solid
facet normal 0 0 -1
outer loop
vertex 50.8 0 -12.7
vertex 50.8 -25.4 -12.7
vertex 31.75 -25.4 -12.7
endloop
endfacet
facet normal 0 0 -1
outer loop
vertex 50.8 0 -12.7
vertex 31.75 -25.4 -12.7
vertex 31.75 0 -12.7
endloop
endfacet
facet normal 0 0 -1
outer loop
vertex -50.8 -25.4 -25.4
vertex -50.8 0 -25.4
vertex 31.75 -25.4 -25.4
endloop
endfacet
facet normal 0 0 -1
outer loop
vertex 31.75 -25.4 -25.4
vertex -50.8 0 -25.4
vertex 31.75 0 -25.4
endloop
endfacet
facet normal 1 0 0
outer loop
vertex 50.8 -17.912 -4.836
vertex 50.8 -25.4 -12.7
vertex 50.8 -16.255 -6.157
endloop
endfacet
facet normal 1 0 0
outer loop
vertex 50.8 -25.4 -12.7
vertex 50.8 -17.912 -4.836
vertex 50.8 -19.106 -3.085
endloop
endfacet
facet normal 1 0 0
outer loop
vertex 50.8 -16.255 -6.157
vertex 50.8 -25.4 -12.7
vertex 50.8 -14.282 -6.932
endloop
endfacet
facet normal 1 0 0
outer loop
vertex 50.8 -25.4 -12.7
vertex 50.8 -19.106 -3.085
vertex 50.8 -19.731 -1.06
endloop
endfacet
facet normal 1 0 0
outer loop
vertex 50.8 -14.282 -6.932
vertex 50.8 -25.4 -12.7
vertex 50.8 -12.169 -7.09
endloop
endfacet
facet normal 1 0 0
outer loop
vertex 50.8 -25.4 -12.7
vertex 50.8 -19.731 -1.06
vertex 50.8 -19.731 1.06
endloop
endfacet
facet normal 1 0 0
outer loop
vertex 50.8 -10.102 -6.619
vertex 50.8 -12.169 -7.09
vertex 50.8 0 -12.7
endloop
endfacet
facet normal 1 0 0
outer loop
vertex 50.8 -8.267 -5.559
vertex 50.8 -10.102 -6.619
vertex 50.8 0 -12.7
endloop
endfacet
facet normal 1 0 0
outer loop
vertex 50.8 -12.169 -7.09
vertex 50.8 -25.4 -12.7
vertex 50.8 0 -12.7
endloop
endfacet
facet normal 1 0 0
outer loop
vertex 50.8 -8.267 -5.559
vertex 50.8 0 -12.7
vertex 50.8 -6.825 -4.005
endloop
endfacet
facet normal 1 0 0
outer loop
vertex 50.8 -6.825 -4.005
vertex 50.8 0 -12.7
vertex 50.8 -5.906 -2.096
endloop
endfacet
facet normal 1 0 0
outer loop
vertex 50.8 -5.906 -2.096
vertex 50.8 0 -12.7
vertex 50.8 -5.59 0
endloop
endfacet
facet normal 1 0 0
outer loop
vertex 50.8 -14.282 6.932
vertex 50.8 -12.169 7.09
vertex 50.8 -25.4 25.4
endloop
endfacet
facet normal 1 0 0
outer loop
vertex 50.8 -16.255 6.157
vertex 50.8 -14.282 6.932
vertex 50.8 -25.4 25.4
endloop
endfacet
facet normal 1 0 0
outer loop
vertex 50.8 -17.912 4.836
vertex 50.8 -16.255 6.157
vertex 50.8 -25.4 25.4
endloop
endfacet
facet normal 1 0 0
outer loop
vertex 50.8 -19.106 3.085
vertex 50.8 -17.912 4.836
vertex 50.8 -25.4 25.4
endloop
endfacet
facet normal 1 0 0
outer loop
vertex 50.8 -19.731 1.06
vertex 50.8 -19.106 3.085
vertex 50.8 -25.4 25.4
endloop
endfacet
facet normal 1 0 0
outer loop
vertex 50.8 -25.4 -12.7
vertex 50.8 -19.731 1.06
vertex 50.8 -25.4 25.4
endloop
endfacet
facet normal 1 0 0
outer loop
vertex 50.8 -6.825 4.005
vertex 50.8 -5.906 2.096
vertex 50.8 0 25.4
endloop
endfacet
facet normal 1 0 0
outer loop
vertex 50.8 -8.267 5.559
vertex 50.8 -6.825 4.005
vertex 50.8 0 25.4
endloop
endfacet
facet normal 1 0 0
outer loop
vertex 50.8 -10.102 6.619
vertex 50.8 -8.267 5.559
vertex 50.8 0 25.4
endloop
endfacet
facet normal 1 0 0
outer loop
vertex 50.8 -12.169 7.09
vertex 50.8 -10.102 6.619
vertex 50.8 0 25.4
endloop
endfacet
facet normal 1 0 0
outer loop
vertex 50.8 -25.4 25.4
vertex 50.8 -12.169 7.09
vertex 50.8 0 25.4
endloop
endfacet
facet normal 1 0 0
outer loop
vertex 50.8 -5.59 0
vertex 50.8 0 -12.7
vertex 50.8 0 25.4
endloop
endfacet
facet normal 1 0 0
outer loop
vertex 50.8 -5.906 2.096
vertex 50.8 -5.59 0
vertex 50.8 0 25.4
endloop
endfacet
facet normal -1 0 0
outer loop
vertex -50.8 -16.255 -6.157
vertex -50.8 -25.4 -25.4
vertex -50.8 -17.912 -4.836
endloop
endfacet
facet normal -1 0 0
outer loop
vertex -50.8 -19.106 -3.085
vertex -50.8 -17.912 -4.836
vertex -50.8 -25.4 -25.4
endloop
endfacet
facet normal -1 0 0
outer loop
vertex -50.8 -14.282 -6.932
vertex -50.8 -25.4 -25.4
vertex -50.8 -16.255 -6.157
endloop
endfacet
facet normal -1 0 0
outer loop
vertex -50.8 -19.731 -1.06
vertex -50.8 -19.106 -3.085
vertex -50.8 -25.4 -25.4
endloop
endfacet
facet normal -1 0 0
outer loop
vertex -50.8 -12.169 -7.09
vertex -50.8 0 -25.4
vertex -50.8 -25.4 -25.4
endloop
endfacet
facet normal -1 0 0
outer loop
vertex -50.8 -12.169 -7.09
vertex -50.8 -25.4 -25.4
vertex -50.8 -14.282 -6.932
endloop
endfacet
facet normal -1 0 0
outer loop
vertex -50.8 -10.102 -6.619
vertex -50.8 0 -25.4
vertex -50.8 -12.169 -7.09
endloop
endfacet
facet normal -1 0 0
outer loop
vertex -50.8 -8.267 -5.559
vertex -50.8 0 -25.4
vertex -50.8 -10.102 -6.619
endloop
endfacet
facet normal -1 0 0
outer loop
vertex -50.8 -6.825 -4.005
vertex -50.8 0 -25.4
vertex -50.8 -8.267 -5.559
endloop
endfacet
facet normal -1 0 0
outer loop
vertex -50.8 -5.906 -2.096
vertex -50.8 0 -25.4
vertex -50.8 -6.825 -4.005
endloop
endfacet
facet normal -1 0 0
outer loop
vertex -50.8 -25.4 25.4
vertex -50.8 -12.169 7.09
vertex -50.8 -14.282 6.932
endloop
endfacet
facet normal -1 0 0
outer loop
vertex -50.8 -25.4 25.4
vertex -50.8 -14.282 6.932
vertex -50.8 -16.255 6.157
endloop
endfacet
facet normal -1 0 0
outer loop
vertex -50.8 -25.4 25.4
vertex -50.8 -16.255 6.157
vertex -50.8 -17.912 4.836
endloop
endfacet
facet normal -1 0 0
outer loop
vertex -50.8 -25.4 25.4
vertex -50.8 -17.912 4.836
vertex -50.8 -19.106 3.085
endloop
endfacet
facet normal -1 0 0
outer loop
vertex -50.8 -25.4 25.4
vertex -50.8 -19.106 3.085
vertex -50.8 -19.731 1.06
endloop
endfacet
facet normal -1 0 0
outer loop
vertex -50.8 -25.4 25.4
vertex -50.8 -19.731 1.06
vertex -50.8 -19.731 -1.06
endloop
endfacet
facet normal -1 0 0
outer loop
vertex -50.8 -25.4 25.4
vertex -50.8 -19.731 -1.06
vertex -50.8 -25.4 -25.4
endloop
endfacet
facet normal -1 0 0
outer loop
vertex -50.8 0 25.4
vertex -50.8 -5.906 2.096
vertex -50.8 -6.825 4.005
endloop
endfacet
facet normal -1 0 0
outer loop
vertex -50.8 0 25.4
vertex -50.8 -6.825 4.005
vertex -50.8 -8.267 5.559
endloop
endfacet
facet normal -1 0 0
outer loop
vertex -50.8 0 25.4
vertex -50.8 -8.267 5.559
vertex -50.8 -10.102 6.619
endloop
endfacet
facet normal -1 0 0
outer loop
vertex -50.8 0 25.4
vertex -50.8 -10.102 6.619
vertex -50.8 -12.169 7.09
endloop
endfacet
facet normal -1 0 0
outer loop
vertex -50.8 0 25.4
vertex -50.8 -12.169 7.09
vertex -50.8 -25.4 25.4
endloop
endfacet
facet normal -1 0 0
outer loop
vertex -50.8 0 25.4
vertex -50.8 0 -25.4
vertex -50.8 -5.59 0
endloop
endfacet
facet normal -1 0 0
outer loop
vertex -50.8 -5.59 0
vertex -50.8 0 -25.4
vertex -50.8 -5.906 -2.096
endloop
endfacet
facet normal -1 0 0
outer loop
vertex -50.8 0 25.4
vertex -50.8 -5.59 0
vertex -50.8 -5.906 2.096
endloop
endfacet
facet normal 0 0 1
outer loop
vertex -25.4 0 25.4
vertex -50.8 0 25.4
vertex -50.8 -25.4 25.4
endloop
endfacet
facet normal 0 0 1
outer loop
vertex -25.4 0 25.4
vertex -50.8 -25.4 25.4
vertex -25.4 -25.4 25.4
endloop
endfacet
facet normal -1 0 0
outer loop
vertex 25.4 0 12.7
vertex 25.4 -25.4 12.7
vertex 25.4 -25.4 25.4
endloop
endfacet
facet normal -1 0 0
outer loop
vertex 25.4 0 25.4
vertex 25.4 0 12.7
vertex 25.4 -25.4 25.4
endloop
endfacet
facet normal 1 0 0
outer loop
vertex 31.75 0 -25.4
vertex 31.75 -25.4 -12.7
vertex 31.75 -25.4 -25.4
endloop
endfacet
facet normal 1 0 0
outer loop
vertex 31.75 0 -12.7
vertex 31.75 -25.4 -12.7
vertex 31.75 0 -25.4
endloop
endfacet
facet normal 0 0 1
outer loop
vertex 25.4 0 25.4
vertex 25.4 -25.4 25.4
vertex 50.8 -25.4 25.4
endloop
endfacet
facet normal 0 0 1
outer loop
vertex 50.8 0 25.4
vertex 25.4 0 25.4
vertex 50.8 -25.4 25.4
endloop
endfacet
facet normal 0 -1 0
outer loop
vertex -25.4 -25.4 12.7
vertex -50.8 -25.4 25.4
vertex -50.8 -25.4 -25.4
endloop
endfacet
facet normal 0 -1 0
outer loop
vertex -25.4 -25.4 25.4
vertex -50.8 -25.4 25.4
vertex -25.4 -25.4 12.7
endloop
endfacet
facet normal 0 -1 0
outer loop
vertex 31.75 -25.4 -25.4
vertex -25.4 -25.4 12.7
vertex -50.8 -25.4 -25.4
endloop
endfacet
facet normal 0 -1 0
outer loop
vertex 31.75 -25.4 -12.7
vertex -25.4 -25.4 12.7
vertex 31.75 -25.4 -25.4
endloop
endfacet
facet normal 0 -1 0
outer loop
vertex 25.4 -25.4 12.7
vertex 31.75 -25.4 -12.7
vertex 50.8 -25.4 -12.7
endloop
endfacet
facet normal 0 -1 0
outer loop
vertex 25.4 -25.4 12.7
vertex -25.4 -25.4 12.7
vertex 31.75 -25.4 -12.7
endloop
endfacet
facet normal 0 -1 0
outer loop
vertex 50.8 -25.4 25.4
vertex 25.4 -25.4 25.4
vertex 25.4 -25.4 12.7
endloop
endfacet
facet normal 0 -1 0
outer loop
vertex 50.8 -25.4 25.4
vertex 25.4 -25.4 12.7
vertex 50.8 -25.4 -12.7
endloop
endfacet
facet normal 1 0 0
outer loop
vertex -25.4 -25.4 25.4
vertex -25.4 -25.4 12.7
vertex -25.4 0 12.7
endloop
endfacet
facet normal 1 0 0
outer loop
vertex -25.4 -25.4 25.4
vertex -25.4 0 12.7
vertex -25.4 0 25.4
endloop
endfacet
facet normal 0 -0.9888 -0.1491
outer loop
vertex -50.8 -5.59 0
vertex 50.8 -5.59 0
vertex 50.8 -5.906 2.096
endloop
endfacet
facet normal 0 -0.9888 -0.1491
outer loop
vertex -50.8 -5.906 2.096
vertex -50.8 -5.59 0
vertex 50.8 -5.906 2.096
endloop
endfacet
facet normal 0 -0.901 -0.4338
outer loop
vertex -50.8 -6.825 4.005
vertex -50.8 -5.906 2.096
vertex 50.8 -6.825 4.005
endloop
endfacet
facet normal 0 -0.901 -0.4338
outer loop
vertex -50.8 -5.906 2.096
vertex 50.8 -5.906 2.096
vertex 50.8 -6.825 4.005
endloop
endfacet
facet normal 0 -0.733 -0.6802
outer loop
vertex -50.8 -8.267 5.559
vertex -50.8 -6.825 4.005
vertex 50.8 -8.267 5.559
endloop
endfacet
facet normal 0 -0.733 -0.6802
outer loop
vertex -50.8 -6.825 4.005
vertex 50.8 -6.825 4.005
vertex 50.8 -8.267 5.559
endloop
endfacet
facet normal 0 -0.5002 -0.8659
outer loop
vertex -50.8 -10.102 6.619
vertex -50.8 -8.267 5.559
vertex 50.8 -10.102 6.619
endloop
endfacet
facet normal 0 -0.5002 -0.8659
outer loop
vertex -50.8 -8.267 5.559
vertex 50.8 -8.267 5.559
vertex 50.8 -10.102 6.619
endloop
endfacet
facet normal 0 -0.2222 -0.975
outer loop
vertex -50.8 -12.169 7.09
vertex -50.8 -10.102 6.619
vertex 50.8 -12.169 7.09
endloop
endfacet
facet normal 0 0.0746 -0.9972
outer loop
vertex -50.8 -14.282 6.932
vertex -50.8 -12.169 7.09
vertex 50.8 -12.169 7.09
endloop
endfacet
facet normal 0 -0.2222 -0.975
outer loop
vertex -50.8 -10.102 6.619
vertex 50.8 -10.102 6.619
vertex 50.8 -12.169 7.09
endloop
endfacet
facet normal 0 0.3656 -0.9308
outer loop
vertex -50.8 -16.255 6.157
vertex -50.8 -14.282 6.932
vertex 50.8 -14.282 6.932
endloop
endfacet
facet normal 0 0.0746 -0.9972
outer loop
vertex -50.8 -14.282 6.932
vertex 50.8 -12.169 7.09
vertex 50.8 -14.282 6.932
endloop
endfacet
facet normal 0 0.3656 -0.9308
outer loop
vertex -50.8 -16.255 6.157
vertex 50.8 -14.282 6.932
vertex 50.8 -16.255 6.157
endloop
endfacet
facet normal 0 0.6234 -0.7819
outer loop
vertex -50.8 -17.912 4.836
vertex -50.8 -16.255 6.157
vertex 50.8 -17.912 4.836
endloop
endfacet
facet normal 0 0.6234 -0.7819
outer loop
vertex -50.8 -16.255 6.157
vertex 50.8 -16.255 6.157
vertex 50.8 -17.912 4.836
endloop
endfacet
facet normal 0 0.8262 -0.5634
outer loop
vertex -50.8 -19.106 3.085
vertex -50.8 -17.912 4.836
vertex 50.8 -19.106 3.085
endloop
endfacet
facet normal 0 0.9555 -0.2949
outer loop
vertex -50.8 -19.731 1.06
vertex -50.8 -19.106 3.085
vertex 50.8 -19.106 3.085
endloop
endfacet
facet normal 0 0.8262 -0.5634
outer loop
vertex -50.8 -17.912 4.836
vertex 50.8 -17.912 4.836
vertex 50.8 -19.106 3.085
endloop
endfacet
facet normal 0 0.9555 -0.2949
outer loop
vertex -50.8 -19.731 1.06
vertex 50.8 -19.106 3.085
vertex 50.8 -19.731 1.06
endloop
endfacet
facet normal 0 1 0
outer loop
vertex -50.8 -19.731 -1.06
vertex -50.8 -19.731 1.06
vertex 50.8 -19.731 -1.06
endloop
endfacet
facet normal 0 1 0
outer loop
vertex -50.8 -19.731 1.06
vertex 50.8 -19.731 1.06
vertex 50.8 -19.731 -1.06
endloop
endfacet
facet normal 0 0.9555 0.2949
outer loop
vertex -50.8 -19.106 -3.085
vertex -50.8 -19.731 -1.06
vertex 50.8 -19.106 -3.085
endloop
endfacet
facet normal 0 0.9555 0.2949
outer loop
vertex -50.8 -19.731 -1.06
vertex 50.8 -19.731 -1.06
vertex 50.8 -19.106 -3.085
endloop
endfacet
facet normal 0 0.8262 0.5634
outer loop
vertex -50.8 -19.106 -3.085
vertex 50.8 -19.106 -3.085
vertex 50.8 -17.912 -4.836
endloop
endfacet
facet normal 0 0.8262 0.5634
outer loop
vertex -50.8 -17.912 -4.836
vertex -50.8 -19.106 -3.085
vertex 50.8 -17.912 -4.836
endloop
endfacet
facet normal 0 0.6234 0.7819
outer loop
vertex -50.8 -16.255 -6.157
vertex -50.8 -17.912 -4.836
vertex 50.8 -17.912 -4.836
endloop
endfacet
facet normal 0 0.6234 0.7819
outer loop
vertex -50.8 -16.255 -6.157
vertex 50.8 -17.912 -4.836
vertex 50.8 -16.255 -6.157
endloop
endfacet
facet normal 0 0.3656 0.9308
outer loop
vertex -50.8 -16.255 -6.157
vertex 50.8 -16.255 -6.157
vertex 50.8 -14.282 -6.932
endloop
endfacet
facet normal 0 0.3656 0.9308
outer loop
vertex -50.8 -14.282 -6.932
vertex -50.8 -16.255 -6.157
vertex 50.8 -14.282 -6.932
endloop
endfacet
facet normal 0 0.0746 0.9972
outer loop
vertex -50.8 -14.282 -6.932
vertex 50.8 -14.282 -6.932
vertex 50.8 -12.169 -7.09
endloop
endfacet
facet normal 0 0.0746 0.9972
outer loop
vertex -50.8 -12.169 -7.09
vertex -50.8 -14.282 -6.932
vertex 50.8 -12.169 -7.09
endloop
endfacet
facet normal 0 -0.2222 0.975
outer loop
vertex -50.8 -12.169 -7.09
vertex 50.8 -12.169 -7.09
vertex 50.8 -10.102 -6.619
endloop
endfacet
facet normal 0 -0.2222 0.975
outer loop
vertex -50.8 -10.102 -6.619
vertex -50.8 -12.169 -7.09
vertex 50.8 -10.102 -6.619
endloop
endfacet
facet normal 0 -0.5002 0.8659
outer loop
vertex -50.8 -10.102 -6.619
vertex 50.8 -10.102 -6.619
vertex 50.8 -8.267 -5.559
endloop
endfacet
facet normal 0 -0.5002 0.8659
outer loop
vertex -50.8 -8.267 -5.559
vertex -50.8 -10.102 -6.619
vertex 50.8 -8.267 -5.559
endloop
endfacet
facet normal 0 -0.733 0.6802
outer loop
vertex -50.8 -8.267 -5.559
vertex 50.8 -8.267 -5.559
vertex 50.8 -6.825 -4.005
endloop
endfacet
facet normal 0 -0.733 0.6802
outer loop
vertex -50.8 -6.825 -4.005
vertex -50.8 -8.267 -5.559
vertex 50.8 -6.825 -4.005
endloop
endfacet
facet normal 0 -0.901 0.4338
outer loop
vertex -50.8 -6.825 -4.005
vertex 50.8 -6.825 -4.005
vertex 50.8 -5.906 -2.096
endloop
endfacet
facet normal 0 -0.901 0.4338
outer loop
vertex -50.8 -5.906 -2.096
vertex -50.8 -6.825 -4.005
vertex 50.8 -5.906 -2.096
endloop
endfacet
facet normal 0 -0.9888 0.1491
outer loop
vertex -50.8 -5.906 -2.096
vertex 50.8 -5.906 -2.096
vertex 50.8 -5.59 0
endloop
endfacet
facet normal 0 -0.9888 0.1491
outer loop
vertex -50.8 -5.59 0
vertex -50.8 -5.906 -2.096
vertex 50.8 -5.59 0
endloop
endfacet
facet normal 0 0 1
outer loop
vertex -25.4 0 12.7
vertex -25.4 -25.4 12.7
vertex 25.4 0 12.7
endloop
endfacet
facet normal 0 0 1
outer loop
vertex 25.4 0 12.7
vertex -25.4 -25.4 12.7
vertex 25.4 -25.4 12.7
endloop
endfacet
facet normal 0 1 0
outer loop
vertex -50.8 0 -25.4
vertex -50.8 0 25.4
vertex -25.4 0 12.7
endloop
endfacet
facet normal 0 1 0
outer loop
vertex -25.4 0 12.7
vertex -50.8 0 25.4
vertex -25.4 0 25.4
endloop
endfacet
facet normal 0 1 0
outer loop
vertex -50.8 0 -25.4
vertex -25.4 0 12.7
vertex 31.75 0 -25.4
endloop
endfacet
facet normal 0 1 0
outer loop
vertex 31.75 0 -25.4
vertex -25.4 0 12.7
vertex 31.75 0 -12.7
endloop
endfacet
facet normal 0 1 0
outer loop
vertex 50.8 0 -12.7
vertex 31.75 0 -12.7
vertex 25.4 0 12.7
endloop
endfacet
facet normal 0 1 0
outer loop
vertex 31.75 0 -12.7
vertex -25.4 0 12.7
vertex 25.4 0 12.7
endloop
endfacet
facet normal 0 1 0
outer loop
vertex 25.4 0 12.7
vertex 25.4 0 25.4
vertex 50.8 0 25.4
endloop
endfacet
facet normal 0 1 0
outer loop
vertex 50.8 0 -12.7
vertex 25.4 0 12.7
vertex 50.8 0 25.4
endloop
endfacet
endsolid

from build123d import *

# Parameters (mm, degrees)
F0_W     = 101.6
F0_H     = 50.8
F1_DEPTH = 25.4
F2_W     = 50.8
F2_H     = 12.7
F3_DEPTH = 25.401
F4_W     = 25.4
F4_H     = 12.7
F5_DEPTH = 19.05
F6_R     = 7.110031
F7_DEPTH = 101.601


with BuildPart() as f1:
    # F0 (on Front) → F1 (new body)
    with BuildSketch(Plane.XZ):
        Rectangle(F0_W, F0_H)
    extrude(amount=F1_DEPTH)

    # F2 (on face) → F3 (cut, through all)
    with BuildSketch(Plane.XZ.offset(25.4)):
        with Locations((0, 19.05)):
            Rectangle(F2_W, F2_H)
    extrude(amount=-F3_DEPTH, mode=Mode.SUBTRACT)

    # F4 (on face) → F5 (cut)
    with BuildSketch(Plane.YZ.offset(50.8)):
        with Locations((-12.7, -19.05)):
            Rectangle(F4_W, F4_H)
    extrude(amount=-F5_DEPTH, mode=Mode.SUBTRACT)

    # F6 (on face) → F7 (cut, through all)
    with BuildSketch(Plane.YZ.offset(50.8)):
        with Locations((-12.7, 0)):
            Circle(F6_R)
    extrude(amount=-F7_DEPTH, mode=Mode.SUBTRACT)


solid = f1.part
